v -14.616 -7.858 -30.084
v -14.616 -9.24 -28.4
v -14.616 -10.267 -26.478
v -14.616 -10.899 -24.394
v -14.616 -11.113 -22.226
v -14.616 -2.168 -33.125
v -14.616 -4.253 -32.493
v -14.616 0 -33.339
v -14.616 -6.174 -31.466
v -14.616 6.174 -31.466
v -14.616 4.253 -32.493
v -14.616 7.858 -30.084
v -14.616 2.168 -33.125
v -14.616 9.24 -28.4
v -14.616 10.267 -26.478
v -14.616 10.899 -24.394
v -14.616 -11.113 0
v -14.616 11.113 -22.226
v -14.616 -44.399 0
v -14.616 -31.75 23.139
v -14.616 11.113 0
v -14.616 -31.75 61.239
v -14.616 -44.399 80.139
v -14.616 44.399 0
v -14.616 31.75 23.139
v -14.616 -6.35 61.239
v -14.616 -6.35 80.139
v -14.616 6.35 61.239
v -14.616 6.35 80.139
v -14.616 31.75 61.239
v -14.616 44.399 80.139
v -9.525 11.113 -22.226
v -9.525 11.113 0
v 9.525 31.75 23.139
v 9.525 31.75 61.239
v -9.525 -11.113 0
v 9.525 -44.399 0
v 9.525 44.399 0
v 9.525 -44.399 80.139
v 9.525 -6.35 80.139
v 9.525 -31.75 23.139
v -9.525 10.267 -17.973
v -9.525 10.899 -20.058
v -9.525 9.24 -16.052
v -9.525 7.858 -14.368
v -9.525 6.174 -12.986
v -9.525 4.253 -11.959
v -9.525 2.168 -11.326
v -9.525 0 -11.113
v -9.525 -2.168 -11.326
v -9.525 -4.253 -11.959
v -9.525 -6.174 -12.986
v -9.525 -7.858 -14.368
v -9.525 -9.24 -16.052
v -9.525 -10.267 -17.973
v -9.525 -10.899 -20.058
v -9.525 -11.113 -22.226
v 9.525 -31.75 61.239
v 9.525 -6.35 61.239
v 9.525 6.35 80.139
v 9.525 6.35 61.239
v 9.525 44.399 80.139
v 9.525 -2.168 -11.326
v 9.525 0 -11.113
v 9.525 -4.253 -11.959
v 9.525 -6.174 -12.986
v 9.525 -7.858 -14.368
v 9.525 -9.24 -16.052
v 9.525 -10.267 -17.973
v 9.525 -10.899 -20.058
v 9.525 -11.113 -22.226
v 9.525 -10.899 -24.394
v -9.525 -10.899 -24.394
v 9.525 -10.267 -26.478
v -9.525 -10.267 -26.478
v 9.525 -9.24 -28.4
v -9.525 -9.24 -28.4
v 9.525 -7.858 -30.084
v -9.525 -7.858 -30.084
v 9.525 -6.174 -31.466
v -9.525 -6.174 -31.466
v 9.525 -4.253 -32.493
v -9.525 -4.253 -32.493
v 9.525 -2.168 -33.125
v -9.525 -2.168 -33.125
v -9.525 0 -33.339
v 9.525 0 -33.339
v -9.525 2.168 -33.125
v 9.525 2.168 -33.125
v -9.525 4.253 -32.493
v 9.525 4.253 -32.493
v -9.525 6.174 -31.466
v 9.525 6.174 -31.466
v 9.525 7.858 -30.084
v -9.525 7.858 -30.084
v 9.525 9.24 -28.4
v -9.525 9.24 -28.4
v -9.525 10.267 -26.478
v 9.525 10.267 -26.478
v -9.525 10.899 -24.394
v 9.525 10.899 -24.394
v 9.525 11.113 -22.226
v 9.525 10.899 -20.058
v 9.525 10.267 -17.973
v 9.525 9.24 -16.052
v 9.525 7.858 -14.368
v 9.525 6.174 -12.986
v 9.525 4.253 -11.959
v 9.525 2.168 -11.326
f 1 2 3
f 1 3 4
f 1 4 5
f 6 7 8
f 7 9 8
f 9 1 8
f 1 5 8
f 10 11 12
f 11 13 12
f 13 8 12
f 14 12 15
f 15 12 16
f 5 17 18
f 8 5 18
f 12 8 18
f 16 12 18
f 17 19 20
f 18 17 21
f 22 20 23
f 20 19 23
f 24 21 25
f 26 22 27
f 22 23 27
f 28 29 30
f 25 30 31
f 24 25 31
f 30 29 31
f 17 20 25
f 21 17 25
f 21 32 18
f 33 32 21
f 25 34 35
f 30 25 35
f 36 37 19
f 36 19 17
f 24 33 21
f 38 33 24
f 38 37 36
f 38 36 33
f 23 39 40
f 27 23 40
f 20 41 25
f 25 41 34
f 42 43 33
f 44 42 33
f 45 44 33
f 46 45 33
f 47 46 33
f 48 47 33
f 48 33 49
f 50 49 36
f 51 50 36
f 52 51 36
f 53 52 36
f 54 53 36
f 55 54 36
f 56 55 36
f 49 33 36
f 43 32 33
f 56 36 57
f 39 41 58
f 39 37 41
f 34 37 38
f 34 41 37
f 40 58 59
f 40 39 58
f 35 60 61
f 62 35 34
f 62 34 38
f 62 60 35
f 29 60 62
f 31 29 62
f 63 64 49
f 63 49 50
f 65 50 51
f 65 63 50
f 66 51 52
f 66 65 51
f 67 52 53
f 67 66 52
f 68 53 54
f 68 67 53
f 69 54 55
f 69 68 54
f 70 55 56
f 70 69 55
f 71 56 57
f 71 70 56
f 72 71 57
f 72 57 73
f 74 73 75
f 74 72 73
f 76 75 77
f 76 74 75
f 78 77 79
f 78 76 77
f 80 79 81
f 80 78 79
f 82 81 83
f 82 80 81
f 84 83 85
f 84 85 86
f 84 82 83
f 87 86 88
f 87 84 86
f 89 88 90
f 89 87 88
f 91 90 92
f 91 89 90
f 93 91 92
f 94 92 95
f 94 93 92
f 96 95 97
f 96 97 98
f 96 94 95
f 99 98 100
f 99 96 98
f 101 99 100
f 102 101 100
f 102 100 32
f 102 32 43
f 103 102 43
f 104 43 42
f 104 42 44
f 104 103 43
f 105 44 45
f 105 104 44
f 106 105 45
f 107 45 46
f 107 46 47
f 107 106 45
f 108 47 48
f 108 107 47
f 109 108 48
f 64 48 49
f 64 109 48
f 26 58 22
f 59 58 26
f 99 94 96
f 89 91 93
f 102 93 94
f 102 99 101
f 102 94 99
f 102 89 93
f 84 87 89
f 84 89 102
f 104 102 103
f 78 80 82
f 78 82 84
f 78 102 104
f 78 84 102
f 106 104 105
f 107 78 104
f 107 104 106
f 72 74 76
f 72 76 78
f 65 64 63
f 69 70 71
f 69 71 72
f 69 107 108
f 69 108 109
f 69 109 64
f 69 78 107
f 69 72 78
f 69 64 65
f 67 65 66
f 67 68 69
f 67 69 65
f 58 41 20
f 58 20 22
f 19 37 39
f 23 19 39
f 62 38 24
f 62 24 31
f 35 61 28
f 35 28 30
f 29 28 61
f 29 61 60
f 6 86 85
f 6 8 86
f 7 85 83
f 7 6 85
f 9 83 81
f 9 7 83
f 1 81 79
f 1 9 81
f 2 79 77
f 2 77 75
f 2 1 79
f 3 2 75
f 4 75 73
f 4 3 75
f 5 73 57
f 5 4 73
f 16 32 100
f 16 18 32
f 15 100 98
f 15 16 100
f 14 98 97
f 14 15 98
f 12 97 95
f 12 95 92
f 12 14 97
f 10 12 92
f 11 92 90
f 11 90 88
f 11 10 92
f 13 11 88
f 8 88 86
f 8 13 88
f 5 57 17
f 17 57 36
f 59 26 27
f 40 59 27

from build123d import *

# Parameters (mm, degrees)
BASE_SKETCH_R      = 11.112881
FEATURE_A_DEPTH    = 9.525
FEATURE_B_SKETCH_W = 22.225762
FEATURE_B_SKETCH_H = 33.338516
FEATURE_B_DEPTH    = 5.09143
FILLET1_R          = 11.112754
FILLET2_R          = 11.112754
FEATURE_C_SKETCH_W = 88.7984
FEATURE_C_SKETCH_H = 23.139146
FEATURE_C_DEPTH    = 24.14143
FEATURE_D_SKETCH_W = 12.6492
FEATURE_D_SKETCH_H = 38.1
FEATURE_D_DEPTH    = 24.14143
FEATURE_E_SKETCH_W = 38.0492
FEATURE_E_SKETCH_H = 18.899378
FEATURE_E_DEPTH    = 24.14143


with BuildPart() as part:
    # Base Sketch → Feature A (new, symmetric)
    with BuildSketch(Plane.YZ):
        with Locations(Location((0, -22.225635, 0), (0, 0, 90))):
            Circle(BASE_SKETCH_R)
    extrude(amount=FEATURE_A_DEPTH, both=True)

    # Feature B Sketch → Feature B (add)
    with BuildSketch(Plane(origin=(-9.525, 0, 0), x_dir=(0, -1, 0), z_dir=(-1, 0, 0))):
        with Locations((0, -16.669258)):
            Rectangle(FEATURE_B_SKETCH_W, FEATURE_B_SKETCH_H)
    extrude(amount=FEATURE_B_DEPTH)

    # Fillet1
    fillet1_edges = [part.edges().sort_by_distance(p)[0] for p in [
        (-12.070715, 11.112881, -33.338516),
    ]]
    fillet(fillet1_edges, radius=FILLET1_R)

    # Fillet2
    fillet2_edges = [part.edges().sort_by_distance(p)[0] for p in [
        (-12.070715, -11.112881, -33.338516),
    ]]
    fillet(fillet2_edges, radius=FILLET2_R)

    # Feature C Sketch → Feature C (add)
    with BuildSketch(Plane.YZ.offset(9.525)):
        with Locations((0, 11.569573)):
            Rectangle(FEATURE_C_SKETCH_W, FEATURE_C_SKETCH_H)
    extrude(amount=-FEATURE_C_DEPTH)

    # Feature D Sketch → Feature D (add)
    with BuildSketch(Plane.YZ.offset(9.525)):
        with Locations((38.0746, 42.189146)):
            Rectangle(FEATURE_D_SKETCH_W, FEATURE_D_SKETCH_H)
        with Locations((-38.0746, 42.189146)):
            Rectangle(FEATURE_D_SKETCH_W, FEATURE_D_SKETCH_H)
    extrude(amount=-FEATURE_D_DEPTH)

    # Feature E Sketch → Feature E (add)
    with BuildSketch(Plane.YZ.offset(9.525)):
        with Locations((25.3746, 70.688835)):
            Rectangle(FEATURE_E_SKETCH_W, FEATURE_E_SKETCH_H)
        with Locations((-25.3746, 70.688835)):
            Rectangle(FEATURE_E_SKETCH_W, FEATURE_E_SKETCH_H)
    extrude(amount=-FEATURE_E_DEPTH)


solid = part.part
